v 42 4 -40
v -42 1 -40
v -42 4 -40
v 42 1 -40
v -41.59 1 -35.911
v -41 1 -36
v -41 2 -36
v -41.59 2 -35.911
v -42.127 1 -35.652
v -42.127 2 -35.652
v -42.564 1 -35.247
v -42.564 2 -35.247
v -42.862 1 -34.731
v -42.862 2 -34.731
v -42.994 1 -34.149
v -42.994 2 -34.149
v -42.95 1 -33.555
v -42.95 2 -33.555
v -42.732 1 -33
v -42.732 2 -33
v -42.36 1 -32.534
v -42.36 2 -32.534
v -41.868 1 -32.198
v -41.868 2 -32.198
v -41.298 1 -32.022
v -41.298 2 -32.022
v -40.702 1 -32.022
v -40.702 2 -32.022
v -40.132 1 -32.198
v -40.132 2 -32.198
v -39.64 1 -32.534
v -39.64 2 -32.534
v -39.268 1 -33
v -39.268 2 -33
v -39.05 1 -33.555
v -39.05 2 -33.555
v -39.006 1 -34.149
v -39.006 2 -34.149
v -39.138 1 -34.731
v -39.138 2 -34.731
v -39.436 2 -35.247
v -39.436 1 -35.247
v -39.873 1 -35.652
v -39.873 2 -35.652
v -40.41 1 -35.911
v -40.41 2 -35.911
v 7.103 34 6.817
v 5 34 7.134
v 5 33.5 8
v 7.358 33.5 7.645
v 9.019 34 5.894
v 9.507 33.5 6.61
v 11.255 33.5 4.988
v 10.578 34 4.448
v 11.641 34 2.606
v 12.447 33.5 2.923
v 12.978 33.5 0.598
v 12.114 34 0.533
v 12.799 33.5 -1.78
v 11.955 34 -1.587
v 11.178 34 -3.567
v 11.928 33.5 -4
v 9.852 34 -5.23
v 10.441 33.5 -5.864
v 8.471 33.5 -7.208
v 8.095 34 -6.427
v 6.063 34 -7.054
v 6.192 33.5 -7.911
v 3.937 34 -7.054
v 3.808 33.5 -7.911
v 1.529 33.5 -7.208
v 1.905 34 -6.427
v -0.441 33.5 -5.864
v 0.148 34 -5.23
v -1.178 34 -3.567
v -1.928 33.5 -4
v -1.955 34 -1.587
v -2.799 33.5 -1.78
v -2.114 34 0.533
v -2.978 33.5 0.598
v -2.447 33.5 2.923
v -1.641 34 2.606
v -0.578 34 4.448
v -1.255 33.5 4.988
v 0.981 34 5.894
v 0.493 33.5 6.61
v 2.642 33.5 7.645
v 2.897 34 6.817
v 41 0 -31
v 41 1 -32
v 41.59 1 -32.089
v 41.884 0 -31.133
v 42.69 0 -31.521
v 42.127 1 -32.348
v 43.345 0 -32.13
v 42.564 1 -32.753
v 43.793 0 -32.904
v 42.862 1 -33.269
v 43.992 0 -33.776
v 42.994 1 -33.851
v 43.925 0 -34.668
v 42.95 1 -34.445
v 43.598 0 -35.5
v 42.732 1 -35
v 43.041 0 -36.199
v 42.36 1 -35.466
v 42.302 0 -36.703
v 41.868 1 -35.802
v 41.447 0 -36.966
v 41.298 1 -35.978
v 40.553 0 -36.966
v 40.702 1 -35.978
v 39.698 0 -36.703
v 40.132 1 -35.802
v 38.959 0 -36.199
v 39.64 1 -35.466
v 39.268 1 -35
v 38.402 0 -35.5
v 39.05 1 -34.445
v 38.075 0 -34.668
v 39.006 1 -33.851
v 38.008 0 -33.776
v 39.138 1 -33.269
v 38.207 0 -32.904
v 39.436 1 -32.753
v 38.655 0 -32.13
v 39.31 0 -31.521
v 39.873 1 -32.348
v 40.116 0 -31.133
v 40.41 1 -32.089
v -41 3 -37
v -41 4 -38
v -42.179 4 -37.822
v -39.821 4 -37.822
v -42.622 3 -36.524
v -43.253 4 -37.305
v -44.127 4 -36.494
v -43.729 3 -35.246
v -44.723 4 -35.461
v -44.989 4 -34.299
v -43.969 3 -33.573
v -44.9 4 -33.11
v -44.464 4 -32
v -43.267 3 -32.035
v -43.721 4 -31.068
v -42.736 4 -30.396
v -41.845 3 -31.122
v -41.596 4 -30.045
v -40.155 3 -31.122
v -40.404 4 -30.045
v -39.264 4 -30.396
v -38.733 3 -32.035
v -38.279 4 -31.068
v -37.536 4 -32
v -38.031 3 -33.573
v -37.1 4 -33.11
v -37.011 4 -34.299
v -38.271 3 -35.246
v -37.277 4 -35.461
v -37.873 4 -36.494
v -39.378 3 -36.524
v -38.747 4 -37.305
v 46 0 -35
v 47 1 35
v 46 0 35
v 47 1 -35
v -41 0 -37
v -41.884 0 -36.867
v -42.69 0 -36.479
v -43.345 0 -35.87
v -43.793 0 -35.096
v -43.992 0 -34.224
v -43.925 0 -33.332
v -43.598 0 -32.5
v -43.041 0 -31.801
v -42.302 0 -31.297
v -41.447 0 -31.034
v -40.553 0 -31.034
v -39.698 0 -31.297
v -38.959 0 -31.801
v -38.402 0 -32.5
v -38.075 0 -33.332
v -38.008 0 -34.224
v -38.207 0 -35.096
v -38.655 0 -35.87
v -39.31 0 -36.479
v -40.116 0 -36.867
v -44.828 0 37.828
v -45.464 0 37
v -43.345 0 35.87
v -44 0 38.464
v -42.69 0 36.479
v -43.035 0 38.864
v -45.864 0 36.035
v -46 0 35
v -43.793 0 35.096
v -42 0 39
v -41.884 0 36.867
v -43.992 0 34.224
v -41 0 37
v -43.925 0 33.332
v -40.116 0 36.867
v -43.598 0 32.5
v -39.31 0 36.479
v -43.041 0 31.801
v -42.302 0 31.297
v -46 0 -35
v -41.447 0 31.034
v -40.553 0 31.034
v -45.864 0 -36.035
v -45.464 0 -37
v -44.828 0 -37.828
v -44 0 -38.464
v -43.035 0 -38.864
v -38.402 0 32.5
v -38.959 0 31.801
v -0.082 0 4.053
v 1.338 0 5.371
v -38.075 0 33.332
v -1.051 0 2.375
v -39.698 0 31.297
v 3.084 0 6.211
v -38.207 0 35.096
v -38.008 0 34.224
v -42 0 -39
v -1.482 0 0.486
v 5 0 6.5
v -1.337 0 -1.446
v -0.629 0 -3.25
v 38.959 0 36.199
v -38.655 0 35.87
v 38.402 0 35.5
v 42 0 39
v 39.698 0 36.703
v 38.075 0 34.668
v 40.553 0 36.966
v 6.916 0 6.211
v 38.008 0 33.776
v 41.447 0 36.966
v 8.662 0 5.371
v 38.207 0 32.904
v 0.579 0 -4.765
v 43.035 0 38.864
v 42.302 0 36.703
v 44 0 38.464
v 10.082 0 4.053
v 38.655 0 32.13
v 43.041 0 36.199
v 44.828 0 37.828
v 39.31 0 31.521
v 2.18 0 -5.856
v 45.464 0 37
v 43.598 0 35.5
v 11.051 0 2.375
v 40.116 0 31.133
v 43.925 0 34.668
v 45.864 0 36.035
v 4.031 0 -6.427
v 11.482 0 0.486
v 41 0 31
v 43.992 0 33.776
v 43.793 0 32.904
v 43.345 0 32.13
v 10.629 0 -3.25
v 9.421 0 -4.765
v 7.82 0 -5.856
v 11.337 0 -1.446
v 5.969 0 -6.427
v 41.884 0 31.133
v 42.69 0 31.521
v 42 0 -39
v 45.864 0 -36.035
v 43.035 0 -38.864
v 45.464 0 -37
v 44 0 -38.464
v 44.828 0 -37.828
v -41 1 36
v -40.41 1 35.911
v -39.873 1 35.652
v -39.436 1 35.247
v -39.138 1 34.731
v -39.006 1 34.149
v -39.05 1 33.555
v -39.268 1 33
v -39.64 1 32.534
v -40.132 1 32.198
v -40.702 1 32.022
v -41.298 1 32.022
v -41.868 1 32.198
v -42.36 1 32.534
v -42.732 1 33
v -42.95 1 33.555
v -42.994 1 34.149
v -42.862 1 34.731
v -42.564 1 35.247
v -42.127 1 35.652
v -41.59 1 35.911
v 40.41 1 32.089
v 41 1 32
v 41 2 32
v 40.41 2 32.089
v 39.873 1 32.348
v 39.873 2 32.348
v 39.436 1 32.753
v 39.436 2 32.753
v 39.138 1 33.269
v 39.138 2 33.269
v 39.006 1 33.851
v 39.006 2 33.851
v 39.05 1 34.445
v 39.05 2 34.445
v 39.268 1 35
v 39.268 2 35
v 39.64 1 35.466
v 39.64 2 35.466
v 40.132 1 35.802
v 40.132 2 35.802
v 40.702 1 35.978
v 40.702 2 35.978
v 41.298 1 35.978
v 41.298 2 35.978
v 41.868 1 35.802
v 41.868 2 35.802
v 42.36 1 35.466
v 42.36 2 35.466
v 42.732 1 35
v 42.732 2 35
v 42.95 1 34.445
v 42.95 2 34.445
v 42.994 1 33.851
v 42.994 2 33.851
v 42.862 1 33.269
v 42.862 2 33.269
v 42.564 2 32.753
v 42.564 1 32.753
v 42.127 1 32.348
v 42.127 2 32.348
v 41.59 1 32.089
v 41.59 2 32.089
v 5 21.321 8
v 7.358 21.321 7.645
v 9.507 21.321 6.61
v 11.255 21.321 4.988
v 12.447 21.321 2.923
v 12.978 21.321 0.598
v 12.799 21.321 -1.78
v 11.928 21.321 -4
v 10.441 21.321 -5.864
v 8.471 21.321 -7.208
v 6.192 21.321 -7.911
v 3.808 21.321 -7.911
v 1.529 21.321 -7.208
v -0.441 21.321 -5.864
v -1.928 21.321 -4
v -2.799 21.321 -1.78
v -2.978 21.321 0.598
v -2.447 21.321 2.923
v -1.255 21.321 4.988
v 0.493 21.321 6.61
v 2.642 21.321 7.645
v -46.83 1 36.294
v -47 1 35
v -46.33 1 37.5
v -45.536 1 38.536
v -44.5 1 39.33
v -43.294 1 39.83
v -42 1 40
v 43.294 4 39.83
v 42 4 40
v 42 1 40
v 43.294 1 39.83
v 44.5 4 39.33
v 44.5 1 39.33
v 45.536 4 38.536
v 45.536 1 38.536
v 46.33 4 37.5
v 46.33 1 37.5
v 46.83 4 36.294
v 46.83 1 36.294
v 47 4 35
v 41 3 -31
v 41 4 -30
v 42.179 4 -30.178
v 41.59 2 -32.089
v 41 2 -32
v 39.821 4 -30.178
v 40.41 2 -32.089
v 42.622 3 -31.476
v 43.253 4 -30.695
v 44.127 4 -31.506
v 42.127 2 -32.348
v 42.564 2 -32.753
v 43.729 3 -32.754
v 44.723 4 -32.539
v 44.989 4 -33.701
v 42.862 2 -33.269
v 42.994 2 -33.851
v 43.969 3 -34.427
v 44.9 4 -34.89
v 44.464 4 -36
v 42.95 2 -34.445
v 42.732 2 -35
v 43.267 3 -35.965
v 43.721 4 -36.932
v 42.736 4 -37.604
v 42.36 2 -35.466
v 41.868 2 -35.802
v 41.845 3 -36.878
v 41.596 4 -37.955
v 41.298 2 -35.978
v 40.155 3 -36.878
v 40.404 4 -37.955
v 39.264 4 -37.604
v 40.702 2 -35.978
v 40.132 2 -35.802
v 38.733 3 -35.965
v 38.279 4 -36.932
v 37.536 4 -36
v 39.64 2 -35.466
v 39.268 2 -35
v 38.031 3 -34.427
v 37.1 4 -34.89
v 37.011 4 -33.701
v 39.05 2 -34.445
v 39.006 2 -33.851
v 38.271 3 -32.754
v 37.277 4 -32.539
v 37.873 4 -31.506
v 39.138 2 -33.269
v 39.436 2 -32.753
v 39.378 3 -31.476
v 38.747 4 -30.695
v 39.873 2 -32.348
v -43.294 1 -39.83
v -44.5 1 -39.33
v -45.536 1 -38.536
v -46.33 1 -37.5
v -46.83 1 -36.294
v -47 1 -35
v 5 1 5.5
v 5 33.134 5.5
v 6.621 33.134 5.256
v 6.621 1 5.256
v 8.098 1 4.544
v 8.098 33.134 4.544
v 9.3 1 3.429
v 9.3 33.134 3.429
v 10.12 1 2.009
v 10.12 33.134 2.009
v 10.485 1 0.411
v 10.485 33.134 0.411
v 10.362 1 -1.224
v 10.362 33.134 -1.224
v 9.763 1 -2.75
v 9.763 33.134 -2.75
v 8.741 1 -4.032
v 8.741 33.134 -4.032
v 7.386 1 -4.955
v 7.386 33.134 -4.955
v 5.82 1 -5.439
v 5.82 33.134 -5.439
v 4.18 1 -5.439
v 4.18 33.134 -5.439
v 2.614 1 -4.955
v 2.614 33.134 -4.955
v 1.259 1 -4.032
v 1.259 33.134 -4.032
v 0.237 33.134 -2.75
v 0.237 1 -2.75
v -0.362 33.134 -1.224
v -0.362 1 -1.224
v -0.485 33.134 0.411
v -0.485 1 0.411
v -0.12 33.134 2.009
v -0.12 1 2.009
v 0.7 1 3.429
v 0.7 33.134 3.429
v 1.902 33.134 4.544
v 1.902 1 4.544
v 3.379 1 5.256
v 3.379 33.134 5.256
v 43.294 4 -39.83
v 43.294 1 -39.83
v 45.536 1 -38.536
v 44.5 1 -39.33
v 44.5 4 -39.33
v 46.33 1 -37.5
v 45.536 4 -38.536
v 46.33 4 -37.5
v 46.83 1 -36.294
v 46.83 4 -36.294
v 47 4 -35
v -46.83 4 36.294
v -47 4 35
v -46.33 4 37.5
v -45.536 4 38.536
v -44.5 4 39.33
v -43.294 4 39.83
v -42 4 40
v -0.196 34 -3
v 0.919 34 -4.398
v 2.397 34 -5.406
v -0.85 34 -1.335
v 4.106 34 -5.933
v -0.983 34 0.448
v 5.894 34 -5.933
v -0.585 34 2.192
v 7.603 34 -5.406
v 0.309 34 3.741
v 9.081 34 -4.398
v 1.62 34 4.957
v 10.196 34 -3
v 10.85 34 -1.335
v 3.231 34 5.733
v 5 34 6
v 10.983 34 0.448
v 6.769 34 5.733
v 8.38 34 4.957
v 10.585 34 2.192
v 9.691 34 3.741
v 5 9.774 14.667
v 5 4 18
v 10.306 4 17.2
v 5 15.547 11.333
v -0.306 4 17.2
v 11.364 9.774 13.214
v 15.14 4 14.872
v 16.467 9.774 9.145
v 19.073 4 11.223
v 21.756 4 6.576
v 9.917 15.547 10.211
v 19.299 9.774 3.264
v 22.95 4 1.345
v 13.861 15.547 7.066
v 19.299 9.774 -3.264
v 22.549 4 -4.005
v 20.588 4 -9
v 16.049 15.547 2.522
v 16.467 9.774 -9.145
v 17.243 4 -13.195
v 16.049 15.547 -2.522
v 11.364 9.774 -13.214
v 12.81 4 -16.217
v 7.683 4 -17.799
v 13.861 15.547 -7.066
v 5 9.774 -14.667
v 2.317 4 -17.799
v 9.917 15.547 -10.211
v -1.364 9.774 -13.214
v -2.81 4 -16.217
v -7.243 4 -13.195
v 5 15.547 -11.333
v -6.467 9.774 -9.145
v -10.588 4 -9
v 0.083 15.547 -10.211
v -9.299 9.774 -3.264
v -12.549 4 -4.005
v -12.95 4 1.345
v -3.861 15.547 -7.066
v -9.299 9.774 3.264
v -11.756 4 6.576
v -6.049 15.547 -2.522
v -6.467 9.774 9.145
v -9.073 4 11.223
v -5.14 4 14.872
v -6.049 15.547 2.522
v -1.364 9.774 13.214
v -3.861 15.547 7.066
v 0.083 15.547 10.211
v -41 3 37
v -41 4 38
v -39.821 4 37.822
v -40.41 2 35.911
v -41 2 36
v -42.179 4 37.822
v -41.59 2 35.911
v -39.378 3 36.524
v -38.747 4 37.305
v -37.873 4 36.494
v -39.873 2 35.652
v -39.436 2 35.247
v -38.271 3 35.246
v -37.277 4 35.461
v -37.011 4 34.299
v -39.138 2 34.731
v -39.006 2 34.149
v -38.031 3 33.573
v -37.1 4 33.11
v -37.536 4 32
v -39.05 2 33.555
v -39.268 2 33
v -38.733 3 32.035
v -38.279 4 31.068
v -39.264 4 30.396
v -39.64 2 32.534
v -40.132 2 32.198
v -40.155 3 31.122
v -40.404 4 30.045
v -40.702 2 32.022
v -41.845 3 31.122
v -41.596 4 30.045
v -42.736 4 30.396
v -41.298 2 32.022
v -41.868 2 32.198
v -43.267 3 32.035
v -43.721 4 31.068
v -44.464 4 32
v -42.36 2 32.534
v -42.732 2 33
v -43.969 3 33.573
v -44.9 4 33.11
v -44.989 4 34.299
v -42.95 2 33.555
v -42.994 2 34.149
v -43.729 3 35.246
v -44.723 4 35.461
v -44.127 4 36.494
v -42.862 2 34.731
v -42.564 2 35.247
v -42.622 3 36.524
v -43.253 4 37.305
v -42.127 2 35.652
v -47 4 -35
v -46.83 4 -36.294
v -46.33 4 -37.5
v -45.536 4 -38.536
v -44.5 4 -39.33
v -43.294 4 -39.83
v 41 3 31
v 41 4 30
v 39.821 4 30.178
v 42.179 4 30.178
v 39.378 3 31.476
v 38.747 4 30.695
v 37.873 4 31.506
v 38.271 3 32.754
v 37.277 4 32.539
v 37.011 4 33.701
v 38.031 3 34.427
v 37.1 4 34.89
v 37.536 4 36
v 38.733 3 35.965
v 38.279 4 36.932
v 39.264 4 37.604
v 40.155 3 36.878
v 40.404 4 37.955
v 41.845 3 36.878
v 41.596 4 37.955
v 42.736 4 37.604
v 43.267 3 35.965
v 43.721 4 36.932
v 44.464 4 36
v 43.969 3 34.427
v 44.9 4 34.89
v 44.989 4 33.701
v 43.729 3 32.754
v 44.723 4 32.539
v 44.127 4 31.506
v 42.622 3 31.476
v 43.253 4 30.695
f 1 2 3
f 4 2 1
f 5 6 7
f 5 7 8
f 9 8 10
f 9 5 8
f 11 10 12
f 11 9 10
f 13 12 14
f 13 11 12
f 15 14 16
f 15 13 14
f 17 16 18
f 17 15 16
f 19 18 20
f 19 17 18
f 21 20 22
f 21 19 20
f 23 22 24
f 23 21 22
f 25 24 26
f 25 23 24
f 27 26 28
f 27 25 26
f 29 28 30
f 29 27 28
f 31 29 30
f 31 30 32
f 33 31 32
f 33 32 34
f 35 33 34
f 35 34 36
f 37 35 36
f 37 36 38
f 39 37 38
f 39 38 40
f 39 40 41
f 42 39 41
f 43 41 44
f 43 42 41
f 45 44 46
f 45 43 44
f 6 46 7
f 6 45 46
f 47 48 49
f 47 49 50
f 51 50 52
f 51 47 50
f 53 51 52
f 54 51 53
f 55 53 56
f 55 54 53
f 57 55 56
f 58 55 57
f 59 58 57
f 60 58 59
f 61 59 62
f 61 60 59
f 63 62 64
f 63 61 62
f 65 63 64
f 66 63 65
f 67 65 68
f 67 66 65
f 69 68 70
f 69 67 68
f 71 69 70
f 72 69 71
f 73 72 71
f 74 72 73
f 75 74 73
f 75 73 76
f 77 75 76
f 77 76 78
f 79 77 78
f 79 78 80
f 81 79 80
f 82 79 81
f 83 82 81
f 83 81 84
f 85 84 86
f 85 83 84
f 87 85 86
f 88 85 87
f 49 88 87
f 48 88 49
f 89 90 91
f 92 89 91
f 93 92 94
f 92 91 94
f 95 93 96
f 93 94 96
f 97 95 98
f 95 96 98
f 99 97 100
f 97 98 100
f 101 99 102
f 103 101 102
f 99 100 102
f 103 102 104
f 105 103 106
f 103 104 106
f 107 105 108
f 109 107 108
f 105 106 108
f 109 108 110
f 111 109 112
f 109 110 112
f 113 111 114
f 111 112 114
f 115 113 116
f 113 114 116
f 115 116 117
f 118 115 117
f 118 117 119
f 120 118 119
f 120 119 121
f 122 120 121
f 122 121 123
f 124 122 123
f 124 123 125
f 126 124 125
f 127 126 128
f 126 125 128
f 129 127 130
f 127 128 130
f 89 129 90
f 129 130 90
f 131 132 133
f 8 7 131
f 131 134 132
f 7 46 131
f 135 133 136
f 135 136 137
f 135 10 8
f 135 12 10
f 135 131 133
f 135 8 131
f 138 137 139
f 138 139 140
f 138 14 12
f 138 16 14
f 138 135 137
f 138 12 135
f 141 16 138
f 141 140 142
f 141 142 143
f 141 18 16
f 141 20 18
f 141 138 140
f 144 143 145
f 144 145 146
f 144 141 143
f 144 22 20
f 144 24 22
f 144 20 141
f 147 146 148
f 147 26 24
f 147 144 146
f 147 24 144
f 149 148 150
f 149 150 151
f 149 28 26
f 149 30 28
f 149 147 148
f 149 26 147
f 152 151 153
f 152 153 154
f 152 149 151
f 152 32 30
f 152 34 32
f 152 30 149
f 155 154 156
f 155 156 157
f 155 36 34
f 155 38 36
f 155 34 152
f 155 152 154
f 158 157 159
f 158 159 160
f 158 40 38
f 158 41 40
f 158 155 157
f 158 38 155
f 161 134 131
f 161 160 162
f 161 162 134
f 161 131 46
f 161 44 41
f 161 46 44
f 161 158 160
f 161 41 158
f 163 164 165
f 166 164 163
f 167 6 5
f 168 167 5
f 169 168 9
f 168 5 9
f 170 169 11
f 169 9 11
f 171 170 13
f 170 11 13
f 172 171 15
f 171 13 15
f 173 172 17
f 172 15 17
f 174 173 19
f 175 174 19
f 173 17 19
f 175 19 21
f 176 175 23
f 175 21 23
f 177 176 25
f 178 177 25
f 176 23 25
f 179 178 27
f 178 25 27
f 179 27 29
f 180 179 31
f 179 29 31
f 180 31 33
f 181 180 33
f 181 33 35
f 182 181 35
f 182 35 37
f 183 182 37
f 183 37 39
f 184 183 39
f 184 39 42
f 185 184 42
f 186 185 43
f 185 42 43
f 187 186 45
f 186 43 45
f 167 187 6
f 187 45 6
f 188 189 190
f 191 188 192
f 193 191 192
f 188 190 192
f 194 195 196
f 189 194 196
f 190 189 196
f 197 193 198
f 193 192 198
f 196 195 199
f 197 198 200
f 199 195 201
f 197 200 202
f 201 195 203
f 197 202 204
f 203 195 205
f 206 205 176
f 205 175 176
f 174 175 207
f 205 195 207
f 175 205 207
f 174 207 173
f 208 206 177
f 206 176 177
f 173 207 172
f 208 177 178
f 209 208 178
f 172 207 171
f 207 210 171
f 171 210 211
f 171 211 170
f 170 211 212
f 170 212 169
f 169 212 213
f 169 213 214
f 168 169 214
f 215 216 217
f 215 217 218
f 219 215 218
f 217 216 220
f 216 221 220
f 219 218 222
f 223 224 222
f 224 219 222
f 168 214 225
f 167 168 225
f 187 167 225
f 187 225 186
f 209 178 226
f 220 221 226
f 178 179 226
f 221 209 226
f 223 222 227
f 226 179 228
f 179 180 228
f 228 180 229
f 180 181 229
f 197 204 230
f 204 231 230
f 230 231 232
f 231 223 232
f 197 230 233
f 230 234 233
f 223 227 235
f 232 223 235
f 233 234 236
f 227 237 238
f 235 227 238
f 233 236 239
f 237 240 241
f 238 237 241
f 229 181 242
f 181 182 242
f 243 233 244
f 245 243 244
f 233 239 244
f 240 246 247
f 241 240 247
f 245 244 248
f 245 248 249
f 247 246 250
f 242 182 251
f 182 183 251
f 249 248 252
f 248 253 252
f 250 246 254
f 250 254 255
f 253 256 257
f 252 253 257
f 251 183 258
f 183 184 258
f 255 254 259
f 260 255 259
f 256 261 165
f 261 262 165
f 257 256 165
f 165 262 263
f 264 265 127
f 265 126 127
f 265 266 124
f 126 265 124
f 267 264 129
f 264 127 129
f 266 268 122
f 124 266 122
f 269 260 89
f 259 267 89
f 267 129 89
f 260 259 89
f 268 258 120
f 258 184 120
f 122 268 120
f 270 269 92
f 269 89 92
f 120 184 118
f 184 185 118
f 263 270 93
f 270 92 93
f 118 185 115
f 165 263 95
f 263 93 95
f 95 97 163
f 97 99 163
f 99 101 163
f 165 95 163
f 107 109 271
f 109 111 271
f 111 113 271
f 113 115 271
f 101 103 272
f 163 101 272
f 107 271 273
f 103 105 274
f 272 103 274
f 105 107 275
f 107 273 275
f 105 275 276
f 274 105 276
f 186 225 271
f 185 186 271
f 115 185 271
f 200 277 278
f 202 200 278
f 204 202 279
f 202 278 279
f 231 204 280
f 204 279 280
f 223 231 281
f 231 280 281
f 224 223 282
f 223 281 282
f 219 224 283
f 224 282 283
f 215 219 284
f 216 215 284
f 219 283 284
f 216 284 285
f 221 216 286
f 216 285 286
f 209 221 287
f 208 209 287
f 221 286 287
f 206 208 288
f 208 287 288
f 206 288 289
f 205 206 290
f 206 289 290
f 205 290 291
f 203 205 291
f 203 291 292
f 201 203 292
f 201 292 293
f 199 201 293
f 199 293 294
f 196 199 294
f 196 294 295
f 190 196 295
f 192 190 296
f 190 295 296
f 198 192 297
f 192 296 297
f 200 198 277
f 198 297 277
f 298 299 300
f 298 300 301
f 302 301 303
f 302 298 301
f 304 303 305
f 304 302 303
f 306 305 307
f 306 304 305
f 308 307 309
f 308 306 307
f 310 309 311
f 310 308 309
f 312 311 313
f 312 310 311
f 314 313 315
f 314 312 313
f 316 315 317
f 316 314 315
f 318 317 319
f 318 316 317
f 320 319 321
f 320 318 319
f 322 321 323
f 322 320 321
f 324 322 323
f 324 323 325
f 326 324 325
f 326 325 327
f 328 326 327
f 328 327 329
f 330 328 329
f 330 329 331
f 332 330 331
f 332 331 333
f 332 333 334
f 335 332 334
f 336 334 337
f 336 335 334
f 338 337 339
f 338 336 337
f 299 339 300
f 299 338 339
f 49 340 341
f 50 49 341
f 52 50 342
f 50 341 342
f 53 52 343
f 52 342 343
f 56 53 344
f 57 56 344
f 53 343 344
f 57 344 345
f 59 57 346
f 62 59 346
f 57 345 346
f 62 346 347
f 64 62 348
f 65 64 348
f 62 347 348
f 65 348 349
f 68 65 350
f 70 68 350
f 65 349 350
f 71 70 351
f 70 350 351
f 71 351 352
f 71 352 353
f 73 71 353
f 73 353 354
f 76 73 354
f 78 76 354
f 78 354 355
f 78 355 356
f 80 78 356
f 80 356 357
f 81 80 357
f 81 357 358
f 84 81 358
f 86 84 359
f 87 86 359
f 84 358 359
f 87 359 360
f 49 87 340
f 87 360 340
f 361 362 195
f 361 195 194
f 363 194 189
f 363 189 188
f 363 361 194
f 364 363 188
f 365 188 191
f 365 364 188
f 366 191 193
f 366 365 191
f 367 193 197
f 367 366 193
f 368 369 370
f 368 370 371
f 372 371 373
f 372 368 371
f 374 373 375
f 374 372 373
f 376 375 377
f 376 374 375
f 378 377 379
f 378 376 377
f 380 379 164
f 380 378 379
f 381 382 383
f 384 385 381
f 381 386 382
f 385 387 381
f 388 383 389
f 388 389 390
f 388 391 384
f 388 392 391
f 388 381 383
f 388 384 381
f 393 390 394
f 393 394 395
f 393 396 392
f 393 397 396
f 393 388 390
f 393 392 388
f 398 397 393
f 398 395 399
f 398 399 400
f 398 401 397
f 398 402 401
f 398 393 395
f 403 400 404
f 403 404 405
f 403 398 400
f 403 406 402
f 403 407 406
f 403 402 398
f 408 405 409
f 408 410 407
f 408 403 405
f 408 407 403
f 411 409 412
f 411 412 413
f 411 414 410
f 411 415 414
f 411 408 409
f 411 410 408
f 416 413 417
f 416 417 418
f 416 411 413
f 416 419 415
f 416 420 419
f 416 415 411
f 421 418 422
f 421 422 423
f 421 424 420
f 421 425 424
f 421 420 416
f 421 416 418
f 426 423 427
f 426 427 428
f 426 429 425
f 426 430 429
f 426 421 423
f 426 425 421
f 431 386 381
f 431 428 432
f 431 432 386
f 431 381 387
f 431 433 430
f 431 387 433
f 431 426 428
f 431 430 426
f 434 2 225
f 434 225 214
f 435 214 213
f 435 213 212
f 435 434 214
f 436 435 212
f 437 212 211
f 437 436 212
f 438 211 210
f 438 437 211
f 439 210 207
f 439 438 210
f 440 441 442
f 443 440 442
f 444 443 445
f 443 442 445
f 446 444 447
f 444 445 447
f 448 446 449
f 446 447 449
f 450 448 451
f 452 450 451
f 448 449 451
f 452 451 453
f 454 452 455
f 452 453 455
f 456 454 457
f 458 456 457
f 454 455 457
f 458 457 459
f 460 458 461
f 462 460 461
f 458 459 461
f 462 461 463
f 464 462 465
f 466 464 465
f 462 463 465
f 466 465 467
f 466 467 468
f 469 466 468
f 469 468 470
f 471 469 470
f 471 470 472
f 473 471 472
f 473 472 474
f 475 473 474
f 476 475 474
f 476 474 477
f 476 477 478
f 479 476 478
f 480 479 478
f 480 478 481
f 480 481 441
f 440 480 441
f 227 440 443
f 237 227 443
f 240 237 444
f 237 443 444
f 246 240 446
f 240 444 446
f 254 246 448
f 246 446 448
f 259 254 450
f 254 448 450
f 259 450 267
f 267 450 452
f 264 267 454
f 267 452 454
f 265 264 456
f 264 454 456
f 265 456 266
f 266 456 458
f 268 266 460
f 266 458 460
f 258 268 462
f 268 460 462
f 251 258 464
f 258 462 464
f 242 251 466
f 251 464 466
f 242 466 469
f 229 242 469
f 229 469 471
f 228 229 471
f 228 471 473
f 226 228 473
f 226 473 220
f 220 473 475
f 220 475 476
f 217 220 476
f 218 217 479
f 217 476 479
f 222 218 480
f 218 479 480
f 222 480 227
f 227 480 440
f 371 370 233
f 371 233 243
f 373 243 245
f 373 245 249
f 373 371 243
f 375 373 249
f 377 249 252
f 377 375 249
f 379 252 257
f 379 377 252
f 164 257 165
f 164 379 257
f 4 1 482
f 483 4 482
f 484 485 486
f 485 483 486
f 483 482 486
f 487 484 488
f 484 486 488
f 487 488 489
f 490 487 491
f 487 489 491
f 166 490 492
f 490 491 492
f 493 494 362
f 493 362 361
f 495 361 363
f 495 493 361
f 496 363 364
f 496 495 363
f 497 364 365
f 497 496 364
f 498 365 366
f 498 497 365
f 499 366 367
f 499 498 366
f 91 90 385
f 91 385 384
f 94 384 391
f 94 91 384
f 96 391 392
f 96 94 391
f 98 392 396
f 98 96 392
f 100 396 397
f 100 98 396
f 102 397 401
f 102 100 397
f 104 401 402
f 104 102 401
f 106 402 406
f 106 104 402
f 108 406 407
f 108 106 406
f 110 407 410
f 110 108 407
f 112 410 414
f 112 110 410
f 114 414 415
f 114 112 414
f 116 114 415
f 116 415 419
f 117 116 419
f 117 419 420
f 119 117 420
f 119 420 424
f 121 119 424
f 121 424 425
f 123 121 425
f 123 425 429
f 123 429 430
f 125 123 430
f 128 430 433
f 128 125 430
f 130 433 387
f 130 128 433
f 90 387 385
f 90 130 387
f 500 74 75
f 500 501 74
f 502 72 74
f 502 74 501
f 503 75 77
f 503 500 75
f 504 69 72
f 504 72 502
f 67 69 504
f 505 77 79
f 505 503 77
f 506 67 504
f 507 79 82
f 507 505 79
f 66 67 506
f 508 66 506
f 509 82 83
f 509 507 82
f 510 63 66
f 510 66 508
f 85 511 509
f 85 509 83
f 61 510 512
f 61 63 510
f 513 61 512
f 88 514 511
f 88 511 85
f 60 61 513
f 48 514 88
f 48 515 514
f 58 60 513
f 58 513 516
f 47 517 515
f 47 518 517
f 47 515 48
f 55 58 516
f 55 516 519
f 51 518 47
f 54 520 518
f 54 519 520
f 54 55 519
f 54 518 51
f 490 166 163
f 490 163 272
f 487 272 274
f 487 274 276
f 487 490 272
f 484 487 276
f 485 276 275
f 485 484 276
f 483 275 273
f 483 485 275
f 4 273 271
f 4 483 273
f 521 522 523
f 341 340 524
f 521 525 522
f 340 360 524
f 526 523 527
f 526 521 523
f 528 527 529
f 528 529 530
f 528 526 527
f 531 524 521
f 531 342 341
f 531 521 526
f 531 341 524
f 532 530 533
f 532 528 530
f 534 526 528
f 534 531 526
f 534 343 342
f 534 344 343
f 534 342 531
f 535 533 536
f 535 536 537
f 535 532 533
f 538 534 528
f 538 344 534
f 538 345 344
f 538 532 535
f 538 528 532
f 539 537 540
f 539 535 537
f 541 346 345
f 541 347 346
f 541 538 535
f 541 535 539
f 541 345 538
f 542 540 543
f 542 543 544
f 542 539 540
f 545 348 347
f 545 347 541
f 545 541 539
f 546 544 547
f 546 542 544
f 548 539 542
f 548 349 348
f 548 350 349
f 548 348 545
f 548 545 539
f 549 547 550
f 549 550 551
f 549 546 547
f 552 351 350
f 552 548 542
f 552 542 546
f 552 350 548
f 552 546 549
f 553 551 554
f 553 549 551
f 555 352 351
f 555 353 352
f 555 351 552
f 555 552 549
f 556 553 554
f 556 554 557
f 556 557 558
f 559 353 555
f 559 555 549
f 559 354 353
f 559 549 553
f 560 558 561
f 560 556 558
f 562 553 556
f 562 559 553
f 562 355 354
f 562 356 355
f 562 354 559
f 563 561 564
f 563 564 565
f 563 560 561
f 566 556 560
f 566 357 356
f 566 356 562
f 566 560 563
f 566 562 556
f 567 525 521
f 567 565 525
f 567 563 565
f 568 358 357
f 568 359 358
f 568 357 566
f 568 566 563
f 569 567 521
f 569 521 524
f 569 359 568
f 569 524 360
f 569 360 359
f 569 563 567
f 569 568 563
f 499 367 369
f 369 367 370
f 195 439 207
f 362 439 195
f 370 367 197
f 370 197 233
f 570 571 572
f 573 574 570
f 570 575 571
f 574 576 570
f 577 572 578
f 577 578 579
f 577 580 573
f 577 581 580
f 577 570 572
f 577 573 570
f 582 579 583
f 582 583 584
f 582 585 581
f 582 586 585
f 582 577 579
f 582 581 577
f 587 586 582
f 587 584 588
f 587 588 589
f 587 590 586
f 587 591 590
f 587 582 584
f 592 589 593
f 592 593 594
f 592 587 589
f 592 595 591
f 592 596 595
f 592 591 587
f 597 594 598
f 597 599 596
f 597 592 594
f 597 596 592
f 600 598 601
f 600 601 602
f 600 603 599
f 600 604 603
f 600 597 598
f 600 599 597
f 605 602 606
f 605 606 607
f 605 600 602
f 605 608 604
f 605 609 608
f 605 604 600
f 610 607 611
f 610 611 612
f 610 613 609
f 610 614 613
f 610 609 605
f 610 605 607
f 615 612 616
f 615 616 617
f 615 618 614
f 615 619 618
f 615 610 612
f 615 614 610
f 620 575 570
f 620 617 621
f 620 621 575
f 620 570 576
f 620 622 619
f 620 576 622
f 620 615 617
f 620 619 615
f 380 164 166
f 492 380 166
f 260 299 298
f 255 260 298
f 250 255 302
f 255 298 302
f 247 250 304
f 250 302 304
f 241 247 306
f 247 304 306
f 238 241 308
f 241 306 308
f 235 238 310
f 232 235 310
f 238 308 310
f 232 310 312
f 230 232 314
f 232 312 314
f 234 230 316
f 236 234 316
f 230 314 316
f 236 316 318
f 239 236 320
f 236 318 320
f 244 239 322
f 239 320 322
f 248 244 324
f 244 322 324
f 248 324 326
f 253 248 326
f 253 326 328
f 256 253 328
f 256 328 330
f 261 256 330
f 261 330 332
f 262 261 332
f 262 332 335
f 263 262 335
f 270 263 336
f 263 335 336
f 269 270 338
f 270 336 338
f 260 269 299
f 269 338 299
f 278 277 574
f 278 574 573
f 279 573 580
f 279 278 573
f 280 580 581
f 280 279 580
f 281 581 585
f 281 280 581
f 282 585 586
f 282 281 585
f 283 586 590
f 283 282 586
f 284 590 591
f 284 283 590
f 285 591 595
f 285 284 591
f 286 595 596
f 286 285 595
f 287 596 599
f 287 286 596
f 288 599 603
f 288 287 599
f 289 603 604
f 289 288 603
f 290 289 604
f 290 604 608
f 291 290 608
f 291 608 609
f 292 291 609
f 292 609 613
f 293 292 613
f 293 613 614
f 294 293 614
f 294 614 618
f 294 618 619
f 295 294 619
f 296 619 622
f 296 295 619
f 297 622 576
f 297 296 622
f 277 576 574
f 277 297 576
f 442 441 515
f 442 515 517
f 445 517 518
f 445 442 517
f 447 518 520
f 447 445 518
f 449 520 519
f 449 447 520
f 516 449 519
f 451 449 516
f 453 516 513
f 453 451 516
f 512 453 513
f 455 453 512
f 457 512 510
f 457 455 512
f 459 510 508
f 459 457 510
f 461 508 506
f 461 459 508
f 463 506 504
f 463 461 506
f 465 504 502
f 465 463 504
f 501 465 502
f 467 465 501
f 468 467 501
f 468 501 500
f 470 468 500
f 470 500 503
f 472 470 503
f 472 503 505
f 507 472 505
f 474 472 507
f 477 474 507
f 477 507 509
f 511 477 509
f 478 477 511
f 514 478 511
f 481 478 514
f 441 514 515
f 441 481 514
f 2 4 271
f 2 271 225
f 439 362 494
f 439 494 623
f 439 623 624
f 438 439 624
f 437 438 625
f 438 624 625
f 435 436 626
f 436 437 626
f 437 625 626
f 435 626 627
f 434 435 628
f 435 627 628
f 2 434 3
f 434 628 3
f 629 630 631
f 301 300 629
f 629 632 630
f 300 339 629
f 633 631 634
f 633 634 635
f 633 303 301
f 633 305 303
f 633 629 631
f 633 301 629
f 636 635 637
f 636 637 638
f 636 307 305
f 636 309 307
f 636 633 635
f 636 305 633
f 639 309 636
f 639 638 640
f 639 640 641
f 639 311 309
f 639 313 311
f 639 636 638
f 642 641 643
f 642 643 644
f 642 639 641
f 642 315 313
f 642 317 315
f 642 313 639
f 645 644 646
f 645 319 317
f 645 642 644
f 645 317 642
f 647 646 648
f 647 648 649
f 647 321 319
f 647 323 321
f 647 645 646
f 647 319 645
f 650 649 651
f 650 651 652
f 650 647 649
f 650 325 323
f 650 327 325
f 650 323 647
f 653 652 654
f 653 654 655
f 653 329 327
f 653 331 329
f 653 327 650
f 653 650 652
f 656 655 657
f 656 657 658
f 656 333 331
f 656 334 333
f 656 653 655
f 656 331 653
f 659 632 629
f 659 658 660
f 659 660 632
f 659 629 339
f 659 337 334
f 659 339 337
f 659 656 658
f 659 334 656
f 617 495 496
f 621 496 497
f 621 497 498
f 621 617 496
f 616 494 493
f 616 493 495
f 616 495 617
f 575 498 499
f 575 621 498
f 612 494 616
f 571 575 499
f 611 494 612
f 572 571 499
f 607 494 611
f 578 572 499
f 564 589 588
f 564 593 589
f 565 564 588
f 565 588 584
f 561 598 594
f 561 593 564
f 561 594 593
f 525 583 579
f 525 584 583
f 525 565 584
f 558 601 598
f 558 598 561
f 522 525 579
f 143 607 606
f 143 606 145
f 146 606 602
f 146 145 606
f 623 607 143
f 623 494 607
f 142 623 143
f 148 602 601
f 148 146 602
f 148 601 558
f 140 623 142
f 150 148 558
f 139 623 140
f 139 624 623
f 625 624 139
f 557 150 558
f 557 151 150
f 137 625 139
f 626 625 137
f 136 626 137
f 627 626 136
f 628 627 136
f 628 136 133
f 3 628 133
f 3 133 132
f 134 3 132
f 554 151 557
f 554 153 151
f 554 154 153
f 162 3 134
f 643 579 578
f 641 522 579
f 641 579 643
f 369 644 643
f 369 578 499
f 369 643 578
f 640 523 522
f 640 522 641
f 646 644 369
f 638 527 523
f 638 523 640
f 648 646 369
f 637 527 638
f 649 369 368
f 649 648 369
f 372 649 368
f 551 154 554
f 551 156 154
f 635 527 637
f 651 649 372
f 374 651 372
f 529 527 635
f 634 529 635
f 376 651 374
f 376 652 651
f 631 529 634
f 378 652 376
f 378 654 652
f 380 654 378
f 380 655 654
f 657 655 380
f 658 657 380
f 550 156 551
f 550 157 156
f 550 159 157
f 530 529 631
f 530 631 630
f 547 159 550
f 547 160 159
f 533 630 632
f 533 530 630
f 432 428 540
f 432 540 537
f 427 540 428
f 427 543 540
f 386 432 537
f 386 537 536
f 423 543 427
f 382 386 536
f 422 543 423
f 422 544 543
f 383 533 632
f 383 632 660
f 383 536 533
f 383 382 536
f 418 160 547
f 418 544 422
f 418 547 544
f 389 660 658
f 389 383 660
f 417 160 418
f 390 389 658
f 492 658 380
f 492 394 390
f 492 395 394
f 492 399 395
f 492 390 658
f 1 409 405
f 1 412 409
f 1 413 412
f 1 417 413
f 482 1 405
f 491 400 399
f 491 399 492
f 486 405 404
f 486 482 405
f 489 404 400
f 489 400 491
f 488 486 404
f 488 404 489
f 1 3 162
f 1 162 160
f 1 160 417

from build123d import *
from OCP.BRepFilletAPI import BRepFilletAPI_MakeChamfer

# Parameters (mm, degrees)
SKETCH_1_W          = 94
SKETCH_1_H          = 80
SKETCH_1_R          = 2
EXTRUDE_1_DEPTH     = 4
FILLET_1_R          = 5
SKETCH_2_R          = 8
EXTRUDE_2_DEPTH     = 30
SKETCH_3_R          = 5.5
CUT_EXTRUDE_1_DEPTH = 71.46275612
CHAMFER_1_SIZE      = 1
CHAMFER_2_SIZE      = 10
CHAMFER_2_SIZE2     = 17.320508076
CHAMFER_3_SIZE      = 2
CHAMFER_4_SIZE      = 0.5
CHAMFER_4_SIZE2     = 0.866025404


with BuildPart() as part:
    # Эскиз1 → Бобышка-Вытянуть1 (new body)
    with BuildSketch(Plane(origin=(0, 0, 0), x_dir=(1, 0, 0), z_dir=(0, 1, 0))):
        Rectangle(SKETCH_1_W, SKETCH_1_H)
        with Locations(Location((41, 34, 0), (0, 0, 270))):
            Circle(SKETCH_1_R, mode=Mode.SUBTRACT)
        with Locations(Location((-41, 34, 0), (0, 0, 90))):
            Circle(SKETCH_1_R, mode=Mode.SUBTRACT)
        with Locations(Location((-41, -34, 0), (0, 0, 270))):
            Circle(SKETCH_1_R, mode=Mode.SUBTRACT)
        with Locations(Location((41, -34, 0), (0, 0, 90))):
            Circle(SKETCH_1_R, mode=Mode.SUBTRACT)
    extrude(amount=EXTRUDE_1_DEPTH)

    # Скругление1
    fillet_1_edges = [part.edges().sort_by_distance(p)[0] for p in [
        (47, 2, 40),
        (-47, 2, 40),
        (-47, 2, -40),
        (47, 2, -40),
    ]]
    fillet(fillet_1_edges, radius=FILLET_1_R)

    # Эскиз2 → Бобышка-Вытянуть2 (add)
    with BuildSketch(Plane(origin=(0, 4, 0), x_dir=(1, 0, 0), z_dir=(0, 1, 0))):
        with Locations(Location((5, 0, 0), (0, 0, 270))):
            Circle(SKETCH_2_R)
    extrude(amount=EXTRUDE_2_DEPTH)

    # Эскиз3 → Вырез-Вытянуть1 (cut, through all)
    with BuildSketch(Plane(origin=(0, 34, 0), x_dir=(1, 0, 0), z_dir=(0, 1, 0))):
        with Locations(Location((5, 0, 0), (0, 0, 270))):
            Circle(SKETCH_3_R)
    extrude(amount=-CUT_EXTRUDE_1_DEPTH, mode=Mode.SUBTRACT)

    # Фаска1
    chamfer_1_edges = [part.edges().sort_by_distance(p)[0] for p in [
        (41, 0, -36),
        (-41, 0, -32),
        (-41, 0, 32),
        (41, 0, 36),
        (0, 0, 40),
        (47, 0, 0),
        (-47, 0, 0),
        (0, 0, -40),
        (45.535533906, 0, 38.535533906),
        (45.535533906, 0, -38.535533906),
        (-45.535533906, 0, -38.535533906),
        (-45.535533906, 0, 38.535533906),
        (5, 0, -5.5),
    ]]
    chamfer(chamfer_1_edges, length=CHAMFER_1_SIZE)

    # Фаска2
    chamfer_2_edges = [part.edges().sort_by_distance(p)[0] for p in [
        (5, 4, -8),
    ]]
    chamfer_2_side = [part.faces().sort_by_distance(p)[0] for p in [
        (0, 4, 38.76565807),
    ]]
    chamfer(chamfer_2_edges, length=CHAMFER_2_SIZE, length2=CHAMFER_2_SIZE2, reference=chamfer_2_side[0])

    # Фаска3
    chamfer_3_edges = [part.edges().sort_by_distance(p)[0] for p in [
        (41, 4, -36),
        (-41, 4, -32),
        (-41, 4, 32),
        (41, 4, 36),
    ]]
    chamfer(chamfer_3_edges, length=CHAMFER_3_SIZE)

    # Фаска4: one chamfer whose edges measure the first distance from different faces: ONE call of the kernel's chamfer builder (chamfer() names one face for all edges)
    chamfer_4_edges_1 = [part.edges().sort_by_distance(p)[0] for p in [
        (5, 34, -8),
    ]]
    chamfer_4_side_1 = [part.faces().sort_by_distance(p)[0] for p in [
        (5, 27.660254038, -8),
    ]]
    chamfer_4_edges_2 = [part.edges().sort_by_distance(p)[0] for p in [
        (5, 34, -5.5),
    ]]
    chamfer_4_side_2 = [part.faces().sort_by_distance(p)[0] for p in [
        (5, 34, -7.77372583),
    ]]
    chamfer_4 = BRepFilletAPI_MakeChamfer(part.part.solid().wrapped)
    for e in chamfer_4_edges_1:
        chamfer_4.Add(CHAMFER_4_SIZE, CHAMFER_4_SIZE2, e.wrapped, chamfer_4_side_1[0].wrapped)  # the first distance lies on this face
    for e in chamfer_4_edges_2:
        chamfer_4.Add(CHAMFER_4_SIZE, CHAMFER_4_SIZE2, e.wrapped, chamfer_4_side_2[0].wrapped)  # the first distance lies on this face
    add(Compound.cast(chamfer_4.Shape()), mode=Mode.REPLACE)


solid = part.part
